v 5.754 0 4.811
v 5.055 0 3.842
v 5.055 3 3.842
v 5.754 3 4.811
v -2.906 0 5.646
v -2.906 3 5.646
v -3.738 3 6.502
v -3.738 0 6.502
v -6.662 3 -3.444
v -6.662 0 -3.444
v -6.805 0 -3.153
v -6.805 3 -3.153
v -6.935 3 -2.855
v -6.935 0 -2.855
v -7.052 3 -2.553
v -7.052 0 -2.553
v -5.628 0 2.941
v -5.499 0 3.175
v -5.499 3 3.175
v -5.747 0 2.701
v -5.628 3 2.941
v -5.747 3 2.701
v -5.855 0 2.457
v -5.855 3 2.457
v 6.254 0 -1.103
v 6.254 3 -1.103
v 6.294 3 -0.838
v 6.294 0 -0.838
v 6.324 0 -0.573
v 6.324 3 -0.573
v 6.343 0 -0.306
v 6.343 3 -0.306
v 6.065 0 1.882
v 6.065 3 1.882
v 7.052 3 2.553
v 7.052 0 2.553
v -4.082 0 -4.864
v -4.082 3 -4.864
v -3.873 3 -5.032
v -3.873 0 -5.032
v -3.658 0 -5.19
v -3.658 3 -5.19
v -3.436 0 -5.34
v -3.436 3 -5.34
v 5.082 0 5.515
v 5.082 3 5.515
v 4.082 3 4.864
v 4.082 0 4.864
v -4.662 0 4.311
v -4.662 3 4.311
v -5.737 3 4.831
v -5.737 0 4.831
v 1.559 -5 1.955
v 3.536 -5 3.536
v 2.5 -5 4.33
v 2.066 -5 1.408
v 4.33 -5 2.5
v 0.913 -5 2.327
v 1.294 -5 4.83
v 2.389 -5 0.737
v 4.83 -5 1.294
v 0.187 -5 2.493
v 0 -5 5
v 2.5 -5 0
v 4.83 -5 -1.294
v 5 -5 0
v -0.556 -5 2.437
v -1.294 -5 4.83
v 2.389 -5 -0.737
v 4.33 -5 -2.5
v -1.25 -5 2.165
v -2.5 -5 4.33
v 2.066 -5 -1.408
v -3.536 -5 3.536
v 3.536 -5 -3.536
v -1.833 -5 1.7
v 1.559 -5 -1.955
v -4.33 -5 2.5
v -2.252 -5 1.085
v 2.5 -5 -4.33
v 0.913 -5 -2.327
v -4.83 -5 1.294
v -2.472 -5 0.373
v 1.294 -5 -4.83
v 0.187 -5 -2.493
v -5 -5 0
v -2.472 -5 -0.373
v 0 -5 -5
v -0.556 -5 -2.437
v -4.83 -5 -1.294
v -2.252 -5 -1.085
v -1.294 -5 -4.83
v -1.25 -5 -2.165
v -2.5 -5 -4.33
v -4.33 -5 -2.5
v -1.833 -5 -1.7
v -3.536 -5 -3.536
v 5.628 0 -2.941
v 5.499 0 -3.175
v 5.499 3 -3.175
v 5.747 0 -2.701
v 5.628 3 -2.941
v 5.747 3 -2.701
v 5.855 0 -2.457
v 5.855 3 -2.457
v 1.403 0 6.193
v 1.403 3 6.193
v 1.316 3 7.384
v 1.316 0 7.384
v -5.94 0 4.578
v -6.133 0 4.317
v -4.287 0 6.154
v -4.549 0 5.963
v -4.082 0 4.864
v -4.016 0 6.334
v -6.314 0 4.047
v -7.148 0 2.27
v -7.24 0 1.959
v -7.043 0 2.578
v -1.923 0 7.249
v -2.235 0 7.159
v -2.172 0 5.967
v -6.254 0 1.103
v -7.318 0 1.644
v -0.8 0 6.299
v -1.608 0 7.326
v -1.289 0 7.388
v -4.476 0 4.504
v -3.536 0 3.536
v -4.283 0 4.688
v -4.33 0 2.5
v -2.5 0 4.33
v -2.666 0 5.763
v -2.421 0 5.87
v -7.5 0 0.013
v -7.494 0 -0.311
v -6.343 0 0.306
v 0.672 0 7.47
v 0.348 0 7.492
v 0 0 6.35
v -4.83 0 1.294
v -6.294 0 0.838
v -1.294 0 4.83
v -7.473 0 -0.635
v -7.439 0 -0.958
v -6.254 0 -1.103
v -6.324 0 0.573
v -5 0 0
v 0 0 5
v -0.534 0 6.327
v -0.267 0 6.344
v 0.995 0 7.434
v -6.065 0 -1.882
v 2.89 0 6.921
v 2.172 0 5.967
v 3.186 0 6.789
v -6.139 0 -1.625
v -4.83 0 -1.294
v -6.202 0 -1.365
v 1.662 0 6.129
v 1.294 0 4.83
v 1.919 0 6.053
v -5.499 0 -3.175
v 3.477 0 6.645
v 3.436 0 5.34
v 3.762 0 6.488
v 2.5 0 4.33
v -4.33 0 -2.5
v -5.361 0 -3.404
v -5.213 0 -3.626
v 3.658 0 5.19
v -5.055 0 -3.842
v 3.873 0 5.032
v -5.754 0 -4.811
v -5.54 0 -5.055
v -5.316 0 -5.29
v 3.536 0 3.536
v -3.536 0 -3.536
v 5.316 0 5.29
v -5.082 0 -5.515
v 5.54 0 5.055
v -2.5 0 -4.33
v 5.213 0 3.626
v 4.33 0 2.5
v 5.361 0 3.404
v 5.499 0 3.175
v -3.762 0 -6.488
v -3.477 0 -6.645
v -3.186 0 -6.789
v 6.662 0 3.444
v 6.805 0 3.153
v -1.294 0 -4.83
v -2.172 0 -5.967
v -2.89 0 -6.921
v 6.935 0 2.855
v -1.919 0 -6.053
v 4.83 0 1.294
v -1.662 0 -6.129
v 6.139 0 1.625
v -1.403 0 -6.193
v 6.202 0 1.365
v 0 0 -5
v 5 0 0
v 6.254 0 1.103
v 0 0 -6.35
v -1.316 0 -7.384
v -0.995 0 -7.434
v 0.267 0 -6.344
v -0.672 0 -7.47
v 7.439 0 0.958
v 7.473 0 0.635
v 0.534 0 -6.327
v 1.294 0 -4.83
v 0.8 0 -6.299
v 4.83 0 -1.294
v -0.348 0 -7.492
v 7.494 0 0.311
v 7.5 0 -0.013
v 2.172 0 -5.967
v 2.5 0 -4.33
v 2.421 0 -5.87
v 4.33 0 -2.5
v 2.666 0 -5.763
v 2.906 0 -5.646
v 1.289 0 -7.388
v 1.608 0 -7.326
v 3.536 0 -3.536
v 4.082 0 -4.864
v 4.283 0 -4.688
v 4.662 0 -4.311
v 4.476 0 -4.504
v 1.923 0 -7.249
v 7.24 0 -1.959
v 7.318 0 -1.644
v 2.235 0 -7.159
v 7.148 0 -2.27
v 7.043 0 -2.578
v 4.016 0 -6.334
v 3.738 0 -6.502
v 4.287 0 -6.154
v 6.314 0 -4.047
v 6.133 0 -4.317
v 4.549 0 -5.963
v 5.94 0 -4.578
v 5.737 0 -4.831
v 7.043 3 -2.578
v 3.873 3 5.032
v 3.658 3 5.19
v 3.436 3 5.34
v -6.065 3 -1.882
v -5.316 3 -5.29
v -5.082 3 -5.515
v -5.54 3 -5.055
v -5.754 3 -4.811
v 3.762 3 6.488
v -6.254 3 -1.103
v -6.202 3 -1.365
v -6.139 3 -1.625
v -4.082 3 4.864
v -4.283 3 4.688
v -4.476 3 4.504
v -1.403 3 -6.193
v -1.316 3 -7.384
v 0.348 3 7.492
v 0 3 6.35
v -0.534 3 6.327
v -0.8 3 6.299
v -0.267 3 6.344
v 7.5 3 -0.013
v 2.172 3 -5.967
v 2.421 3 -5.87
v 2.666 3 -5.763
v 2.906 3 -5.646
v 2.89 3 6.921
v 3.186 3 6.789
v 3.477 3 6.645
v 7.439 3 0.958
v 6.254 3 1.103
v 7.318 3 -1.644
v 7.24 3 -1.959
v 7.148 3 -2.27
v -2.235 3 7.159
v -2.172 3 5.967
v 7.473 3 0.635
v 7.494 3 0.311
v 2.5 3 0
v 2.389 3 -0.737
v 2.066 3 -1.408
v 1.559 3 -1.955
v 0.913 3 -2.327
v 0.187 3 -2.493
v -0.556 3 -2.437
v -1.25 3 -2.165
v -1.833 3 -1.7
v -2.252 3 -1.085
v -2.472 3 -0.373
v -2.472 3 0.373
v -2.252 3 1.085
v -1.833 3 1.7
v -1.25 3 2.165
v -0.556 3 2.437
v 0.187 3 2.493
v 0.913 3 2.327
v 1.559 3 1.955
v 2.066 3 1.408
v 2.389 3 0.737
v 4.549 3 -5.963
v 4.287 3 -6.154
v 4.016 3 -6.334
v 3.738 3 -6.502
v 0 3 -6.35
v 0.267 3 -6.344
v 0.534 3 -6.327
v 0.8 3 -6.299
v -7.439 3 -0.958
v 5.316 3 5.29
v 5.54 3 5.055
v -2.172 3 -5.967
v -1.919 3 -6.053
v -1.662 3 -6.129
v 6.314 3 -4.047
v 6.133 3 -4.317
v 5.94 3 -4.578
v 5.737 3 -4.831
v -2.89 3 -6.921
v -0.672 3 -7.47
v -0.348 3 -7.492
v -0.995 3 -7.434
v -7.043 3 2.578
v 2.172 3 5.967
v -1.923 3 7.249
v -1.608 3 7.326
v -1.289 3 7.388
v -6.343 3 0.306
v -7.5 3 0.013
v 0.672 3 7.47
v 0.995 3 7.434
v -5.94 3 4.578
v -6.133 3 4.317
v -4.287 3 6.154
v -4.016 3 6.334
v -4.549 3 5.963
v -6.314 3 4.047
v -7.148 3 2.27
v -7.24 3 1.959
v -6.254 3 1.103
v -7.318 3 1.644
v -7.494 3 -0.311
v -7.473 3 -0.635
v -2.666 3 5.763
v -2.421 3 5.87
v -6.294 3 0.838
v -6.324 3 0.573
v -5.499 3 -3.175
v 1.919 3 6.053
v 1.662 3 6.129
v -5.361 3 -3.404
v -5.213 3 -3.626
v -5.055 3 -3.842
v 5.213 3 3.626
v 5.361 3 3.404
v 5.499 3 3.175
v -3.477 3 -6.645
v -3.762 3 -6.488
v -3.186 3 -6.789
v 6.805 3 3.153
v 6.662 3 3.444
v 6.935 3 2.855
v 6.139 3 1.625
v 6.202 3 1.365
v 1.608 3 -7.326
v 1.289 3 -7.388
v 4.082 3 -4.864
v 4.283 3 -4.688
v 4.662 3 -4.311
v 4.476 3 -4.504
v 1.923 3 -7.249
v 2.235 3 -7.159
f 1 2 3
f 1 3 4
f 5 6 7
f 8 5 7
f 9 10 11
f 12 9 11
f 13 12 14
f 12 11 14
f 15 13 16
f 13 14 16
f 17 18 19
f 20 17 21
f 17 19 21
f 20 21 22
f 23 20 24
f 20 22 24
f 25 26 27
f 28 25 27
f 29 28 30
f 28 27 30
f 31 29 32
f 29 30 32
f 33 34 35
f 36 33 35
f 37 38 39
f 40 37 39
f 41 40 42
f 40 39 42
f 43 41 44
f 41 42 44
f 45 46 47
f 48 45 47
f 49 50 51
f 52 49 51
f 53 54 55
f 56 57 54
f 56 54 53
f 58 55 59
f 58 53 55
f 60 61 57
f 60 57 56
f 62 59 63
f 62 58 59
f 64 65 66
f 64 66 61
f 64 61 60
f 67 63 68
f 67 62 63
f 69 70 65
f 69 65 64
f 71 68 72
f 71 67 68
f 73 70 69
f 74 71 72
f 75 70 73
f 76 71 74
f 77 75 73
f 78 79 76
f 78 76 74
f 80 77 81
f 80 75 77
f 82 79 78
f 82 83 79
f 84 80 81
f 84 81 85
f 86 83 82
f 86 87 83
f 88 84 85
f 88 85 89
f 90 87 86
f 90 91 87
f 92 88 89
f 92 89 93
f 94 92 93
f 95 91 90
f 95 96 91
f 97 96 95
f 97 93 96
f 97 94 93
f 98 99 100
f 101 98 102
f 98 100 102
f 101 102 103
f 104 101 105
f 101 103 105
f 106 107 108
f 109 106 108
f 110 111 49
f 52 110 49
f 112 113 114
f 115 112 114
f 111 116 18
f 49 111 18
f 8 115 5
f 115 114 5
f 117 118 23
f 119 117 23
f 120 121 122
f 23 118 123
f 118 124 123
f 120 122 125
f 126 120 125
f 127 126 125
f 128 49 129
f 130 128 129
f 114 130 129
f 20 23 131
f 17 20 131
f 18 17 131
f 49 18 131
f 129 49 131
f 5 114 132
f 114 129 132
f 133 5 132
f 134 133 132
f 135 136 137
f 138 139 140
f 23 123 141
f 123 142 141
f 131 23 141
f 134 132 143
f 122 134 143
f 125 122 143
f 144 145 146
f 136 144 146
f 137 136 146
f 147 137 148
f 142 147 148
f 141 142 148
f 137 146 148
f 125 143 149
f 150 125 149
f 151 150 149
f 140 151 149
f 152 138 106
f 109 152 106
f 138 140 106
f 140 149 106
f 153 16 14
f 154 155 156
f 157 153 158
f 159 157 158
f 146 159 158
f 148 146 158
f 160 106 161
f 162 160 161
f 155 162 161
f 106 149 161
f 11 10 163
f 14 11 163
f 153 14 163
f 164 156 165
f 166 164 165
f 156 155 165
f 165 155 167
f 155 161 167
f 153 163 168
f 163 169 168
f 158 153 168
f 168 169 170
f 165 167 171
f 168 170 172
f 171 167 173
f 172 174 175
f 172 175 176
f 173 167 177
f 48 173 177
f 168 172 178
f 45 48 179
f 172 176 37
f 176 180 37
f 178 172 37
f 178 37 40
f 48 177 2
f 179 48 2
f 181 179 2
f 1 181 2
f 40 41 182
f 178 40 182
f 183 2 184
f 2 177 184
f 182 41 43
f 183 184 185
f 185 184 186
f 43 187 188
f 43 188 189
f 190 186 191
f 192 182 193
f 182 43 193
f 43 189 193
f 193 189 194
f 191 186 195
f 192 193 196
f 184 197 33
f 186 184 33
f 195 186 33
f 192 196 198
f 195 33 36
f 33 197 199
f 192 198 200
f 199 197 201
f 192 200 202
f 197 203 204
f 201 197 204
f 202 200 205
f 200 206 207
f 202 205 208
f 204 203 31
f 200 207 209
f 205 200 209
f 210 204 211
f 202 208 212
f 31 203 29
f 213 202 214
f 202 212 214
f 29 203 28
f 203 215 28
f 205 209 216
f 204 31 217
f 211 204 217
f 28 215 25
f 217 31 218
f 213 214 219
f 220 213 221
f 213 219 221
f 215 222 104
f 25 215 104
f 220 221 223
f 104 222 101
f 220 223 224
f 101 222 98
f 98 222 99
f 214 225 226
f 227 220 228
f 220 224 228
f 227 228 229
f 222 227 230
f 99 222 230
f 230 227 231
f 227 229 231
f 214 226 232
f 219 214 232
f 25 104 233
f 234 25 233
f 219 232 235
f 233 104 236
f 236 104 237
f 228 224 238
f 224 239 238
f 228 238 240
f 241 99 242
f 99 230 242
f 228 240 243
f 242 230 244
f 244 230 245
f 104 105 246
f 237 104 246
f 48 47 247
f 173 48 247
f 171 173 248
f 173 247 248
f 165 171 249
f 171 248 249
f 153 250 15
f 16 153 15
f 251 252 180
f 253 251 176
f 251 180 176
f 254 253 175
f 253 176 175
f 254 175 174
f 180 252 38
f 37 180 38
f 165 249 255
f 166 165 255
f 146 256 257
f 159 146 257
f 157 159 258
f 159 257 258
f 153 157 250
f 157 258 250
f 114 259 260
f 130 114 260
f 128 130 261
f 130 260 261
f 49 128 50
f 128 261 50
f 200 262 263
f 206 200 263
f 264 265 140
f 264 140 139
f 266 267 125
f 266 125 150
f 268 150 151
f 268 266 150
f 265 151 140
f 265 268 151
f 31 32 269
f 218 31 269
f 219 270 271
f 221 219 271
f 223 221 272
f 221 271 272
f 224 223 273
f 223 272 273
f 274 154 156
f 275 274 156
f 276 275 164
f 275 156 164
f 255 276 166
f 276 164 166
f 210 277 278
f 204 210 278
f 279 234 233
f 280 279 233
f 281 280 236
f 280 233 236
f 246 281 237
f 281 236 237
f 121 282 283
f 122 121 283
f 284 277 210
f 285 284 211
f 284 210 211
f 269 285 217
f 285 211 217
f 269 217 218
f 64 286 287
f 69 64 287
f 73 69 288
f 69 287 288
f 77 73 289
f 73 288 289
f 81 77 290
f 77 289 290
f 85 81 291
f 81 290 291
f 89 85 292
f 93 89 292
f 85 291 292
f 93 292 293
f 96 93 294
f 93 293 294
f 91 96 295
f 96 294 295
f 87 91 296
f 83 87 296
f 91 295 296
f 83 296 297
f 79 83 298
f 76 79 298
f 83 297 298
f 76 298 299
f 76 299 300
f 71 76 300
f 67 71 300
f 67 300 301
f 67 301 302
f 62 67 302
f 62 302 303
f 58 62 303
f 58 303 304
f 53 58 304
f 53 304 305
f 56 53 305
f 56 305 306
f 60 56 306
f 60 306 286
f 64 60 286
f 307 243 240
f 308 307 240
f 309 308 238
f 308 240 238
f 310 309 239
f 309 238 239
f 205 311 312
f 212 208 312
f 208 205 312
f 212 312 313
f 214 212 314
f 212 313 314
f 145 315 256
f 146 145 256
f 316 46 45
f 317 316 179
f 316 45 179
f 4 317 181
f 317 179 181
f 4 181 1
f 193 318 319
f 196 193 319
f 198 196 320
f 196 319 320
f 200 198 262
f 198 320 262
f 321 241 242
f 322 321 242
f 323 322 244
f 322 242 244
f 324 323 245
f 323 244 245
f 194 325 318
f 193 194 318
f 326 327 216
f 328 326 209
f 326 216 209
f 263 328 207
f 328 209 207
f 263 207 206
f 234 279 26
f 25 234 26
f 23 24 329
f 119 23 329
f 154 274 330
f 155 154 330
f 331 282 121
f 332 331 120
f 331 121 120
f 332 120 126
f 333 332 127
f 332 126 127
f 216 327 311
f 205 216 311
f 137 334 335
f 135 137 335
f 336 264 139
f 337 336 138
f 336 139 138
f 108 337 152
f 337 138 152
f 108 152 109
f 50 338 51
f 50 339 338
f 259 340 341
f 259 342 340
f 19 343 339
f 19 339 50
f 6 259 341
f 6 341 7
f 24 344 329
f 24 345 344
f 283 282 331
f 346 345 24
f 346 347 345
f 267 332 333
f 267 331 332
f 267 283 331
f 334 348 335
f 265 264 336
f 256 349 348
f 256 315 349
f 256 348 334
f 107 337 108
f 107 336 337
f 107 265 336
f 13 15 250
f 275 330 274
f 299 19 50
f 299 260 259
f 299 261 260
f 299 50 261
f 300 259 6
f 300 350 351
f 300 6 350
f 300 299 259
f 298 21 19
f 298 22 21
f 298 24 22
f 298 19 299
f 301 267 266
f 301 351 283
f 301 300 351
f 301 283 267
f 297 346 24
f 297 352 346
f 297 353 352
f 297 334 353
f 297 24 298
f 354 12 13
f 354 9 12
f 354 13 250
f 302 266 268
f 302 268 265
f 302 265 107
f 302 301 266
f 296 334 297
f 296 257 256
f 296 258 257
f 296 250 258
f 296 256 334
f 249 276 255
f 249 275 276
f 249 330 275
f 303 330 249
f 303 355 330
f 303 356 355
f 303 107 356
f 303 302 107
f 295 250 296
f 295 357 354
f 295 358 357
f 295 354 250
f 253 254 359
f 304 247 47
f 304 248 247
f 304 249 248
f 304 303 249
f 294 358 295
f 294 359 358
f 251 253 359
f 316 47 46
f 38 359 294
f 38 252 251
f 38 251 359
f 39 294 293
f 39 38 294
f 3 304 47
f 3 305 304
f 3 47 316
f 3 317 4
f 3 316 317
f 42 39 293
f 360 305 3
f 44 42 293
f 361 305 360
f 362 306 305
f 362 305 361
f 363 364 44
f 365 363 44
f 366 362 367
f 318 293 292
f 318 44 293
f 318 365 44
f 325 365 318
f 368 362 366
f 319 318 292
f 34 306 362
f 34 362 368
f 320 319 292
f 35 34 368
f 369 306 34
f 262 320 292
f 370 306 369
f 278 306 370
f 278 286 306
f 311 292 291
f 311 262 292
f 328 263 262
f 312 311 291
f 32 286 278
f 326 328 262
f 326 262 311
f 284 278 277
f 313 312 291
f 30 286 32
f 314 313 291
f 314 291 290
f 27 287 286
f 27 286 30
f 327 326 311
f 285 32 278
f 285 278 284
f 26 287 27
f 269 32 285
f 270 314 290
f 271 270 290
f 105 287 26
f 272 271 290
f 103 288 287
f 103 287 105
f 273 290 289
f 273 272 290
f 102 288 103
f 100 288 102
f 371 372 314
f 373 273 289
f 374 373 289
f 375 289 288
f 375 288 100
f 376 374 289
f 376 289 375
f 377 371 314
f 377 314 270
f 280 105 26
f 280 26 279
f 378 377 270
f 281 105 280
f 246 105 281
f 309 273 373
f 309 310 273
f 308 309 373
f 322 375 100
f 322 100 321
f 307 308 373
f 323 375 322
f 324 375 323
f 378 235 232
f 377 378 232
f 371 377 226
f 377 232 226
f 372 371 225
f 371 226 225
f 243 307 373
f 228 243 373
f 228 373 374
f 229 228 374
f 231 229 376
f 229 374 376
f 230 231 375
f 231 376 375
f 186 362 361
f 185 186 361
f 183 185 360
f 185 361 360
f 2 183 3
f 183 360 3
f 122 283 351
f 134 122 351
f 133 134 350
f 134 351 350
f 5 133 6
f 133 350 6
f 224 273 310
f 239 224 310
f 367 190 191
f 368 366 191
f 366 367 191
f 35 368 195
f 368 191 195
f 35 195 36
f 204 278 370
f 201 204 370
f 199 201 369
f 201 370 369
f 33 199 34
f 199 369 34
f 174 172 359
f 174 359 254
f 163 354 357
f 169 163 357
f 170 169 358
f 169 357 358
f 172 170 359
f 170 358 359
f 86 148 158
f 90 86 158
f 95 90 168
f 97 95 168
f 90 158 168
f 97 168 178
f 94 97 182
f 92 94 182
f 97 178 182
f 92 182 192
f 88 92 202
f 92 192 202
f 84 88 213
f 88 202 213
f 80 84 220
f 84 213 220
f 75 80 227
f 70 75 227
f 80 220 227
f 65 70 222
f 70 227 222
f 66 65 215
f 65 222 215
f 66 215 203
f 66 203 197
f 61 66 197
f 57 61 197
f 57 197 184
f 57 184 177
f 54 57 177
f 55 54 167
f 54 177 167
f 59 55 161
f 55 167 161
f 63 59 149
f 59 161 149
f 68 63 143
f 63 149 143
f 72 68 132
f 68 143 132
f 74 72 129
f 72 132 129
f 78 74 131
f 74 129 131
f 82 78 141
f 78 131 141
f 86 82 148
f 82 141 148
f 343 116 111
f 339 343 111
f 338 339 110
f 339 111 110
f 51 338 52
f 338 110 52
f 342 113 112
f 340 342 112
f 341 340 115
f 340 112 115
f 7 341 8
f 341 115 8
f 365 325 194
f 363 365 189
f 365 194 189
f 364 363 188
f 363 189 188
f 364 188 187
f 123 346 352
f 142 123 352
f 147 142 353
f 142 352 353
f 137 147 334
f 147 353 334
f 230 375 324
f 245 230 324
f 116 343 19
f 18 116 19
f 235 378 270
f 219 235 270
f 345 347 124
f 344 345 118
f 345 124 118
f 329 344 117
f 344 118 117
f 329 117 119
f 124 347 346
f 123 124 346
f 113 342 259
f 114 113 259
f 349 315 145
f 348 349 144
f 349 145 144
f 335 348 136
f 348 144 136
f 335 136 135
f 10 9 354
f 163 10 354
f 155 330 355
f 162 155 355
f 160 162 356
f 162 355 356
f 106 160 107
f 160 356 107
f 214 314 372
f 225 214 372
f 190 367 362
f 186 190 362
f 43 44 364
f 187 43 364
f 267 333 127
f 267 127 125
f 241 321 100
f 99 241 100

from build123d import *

# Parameters (mm, degrees)
SKETCH1_R           = 7.5
BOSS_EXTRUDE1_DEPTH = 3
SKETCH2_R           = 5
BOSS_EXTRUDE2_DEPTH = 5
CUT_EXTRUDE1_REACH  = 10
SKETCH3_R           = 2.5
CUT_EXTRUDE2_REACH  = 10


with BuildPart() as part:
    # Sketch1 → Boss-Extrude1 (new body)
    with BuildSketch(Plane(origin=(0, 0, 0), x_dir=(1, 0, 0), z_dir=(0, 1, 0))):
        Circle(SKETCH1_R)
    extrude(amount=BOSS_EXTRUDE1_DEPTH)

    # Sketch2 → Boss-Extrude2 (add)
    with BuildSketch(Plane(origin=(0, 0, 0), x_dir=(-1, 0, 0), z_dir=(0, -1, 0))):
        Circle(SKETCH2_R)
    extrude(amount=BOSS_EXTRUDE2_DEPTH)

    # Sketch3 → Cut-Extrude1 (cut, up to next)
    with BuildSketch(Plane(origin=(0, 3, 0), x_dir=(1, 0, 0), z_dir=(0, 1, 0)), mode=Mode.PRIVATE) as cut_extrude1_sk1:
        Circle(SKETCH3_R)
    cut_extrude1_tool1 = extrude(cut_extrude1_sk1.sketch, amount=-CUT_EXTRUDE1_REACH, mode=Mode.PRIVATE) & part.part
    add(cut_extrude1_tool1.solids().sort_by_distance((0, 3, 0))[0], mode=Mode.SUBTRACT)

    # Sketch4 → Cut-Extrude2 (cut, up to next)
    with BuildSketch(Plane(origin=(0, 3, 0), x_dir=(1, 0, 0), z_dir=(0, 1, 0)), mode=Mode.PRIVATE) as cut_extrude2_sk1:
        with BuildLine():
            Line((-1.289148398, -7.388375762), (-0.799951005, -6.299410956))
            ThreePointArc((-0.799951005, -6.299410956), (-0.400774519, -6.337340119), (0, -6.35))
            Line((0, -6.35), (0.348116052, -7.491916658))
            ThreePointArc((0.348116052, -7.491916658), (-0.473355731, -7.485047385), (-1.289148398, -7.388375762))
        make_face()
    cut_extrude2_tool1 = extrude(cut_extrude2_sk1.sketch, amount=-CUT_EXTRUDE2_REACH, mode=Mode.PRIVATE) & part.part
    add(cut_extrude2_tool1.solids().sort_by_distance((-0.440605, 3, 6.967167))[0], mode=Mode.SUBTRACT)
    # Sketch4 → Cut-Extrude2 (cut, up to next)
    with BuildSketch(Plane(origin=(0, 3, 0), x_dir=(1, 0, 0), z_dir=(0, 1, 0)), mode=Mode.PRIVATE) as cut_extrude2_sk2:
        with BuildLine():
            Line((-2.235264324, -7.159161501), (-2.17182791, -5.967048142))
            ThreePointArc((-2.17182791, -5.967048142), (-2.544102834, -5.818078787), (-2.906233494, -5.645910633))
            Line((-2.906233494, -5.645910633), (-3.738376574, -6.501887464))
            ThreePointArc((-3.738376574, -6.501887464), (-3.004845867, -6.871746599), (-2.235264324, -7.159161501))
        make_face()
    cut_extrude2_tool2 = extrude(cut_extrude2_sk2.sketch, amount=-CUT_EXTRUDE2_REACH, mode=Mode.PRIVATE) & part.part
    add(cut_extrude2_tool2.solids().sort_by_distance((-2.796945, 3, 6.3963))[0], mode=Mode.SUBTRACT)
    # Sketch4 → Cut-Extrude2 (cut, up to next)
    with BuildSketch(Plane(origin=(0, 3, 0), x_dir=(1, 0, 0), z_dir=(0, 1, 0)), mode=Mode.PRIVATE) as cut_extrude2_sk3:
        with BuildLine():
            Line((-4.549038834, -5.962905809), (-4.081701322, -4.864382214))
            ThreePointArc((-4.081701322, -4.864382214), (-4.3805748, -4.597071287), (-4.661981333, -4.311430164))
            Line((-4.661981333, -4.311430164), (-5.736701363, -4.831175579))
            ThreePointArc((-5.736701363, -4.831175579), (-5.173907244, -5.429611756), (-4.549038834, -5.962905809))
        make_face()
    cut_extrude2_tool3 = extrude(cut_extrude2_sk3.sketch, amount=-CUT_EXTRUDE2_REACH, mode=Mode.PRIVATE) & part.part
    add(cut_extrude2_tool3.solids().sort_by_distance((-4.815932, 3, 5.053944))[0], mode=Mode.SUBTRACT)
    # Sketch4 → Cut-Extrude2 (cut, up to next)
    with BuildSketch(Plane(origin=(0, 3, 0), x_dir=(1, 0, 0), z_dir=(0, 1, 0)), mode=Mode.PRIVATE) as cut_extrude2_sk4:
        with BuildLine():
            Line((-6.314132123, -4.047435674), (-5.499261314, -3.175))
            ThreePointArc((-5.499261314, -3.175), (-5.688684795, -2.821589145), (-5.855425419, -2.456927586))
            Line((-5.855425419, -2.456927586), (-7.043095302, -2.577752619))
            ThreePointArc((-7.043095302, -2.577752619), (-6.718919049, -3.332585604), (-6.314132123, -4.047435674))
        make_face()
    cut_extrude2_tool4 = extrude(cut_extrude2_sk4.sketch, amount=-CUT_EXTRUDE2_REACH, mode=Mode.PRIVATE) & part.part
    add(cut_extrude2_tool4.solids().sort_by_distance((-6.254046, 3, 3.102009))[0], mode=Mode.SUBTRACT)
    # Sketch4 → Cut-Extrude2 (cut, up to next)
    with BuildSketch(Plane(origin=(0, 3, 0), x_dir=(1, 0, 0), z_dir=(0, 1, 0)), mode=Mode.PRIVATE) as cut_extrude2_sk5:
        with BuildLine():
            Line((-7.317647892, -1.643785062), (-6.253529232, -1.102665928))
            ThreePointArc((-6.253529232, -1.102665928), (-6.310655448, -0.705781709), (-6.342618783, -0.306083282))
            Line((-6.342618783, -0.306083282), (-7.499988003, -0.01341465))
            ThreePointArc((-7.499988003, -0.01341465), (-7.453530056, -0.833600444), (-7.317647892, -1.643785062))
        make_face()
    cut_extrude2_tool5 = extrude(cut_extrude2_sk5.sketch, amount=-CUT_EXTRUDE2_REACH, mode=Mode.PRIVATE) & part.part
    add(cut_extrude2_tool5.solids().sort_by_distance((-6.93783, 3, 0.775925))[0], mode=Mode.SUBTRACT)
    # Sketch4 → Cut-Extrude2 (cut, up to next)
    with BuildSketch(Plane(origin=(0, 3, 0), x_dir=(1, 0, 0), z_dir=(0, 1, 0)), mode=Mode.PRIVATE) as cut_extrude2_sk6:
        with BuildLine():
            Line((-7.438547328, 0.958130288), (-6.253529232, 1.102665928))
            ThreePointArc((-6.253529232, 1.102665928), (-6.171467918, 1.495153417), (-6.064798715, 1.881679184))
            Line((-6.064798715, 1.881679184), (-7.052271463, 2.552541324))
            ThreePointArc((-7.052271463, 2.552541324), (-7.289135336, 1.765929232), (-7.438547328, 0.958130288))
        make_face()
    cut_extrude2_tool6 = extrude(cut_extrude2_sk6.sketch, amount=-CUT_EXTRUDE2_REACH, mode=Mode.PRIVATE) & part.part
    add(cut_extrude2_tool6.solids().sort_by_distance((-6.78481, 3, -1.643747))[0], mode=Mode.SUBTRACT)
    # Sketch4 → Cut-Extrude2 (cut, up to next)
    with BuildSketch(Plane(origin=(0, 3, 0), x_dir=(1, 0, 0), z_dir=(0, 1, 0)), mode=Mode.PRIVATE) as cut_extrude2_sk7:
        with BuildLine():
            Line((-6.662248175, 3.444480985), (-5.499261314, 3.175))
            ThreePointArc((-5.499261314, 3.175), (-5.287910276, 3.515750974), (-5.055474414, 3.84248337))
            Line((-5.055474414, 3.84248337), (-5.753946904, 4.810623143))
            ThreePointArc((-5.753946904, 4.810623143), (-6.245563318, 4.152461781), (-6.662248175, 3.444480985))
        make_face()
    cut_extrude2_tool7 = extrude(cut_extrude2_sk7.sketch, amount=-CUT_EXTRUDE2_REACH, mode=Mode.PRIVATE) & part.part
    add(cut_extrude2_tool7.solids().sort_by_distance((-5.813441, 3, -3.865159))[0], mode=Mode.SUBTRACT)
    # Sketch4 → Cut-Extrude2 (cut, up to next)
    with BuildSketch(Plane(origin=(0, 3, 0), x_dir=(1, 0, 0), z_dir=(0, 1, 0)), mode=Mode.PRIVATE) as cut_extrude2_sk8:
        with BuildLine():
            Line((-5.082383568, 5.51537644), (-4.081701322, 4.864382214))
            ThreePointArc((-4.081701322, 4.864382214), (-3.766552614, 5.112297078), (-3.436385289, 5.339827352))
            Line((-3.436385289, 5.339827352), (-3.761611429, 6.488472814))
            ThreePointArc((-3.761611429, 6.488472814), (-4.448684189, 6.038146155), (-5.082383568, 5.51537644))
        make_face()
    cut_extrude2_tool8 = extrude(cut_extrude2_sk8.sketch, amount=-CUT_EXTRUDE2_REACH, mode=Mode.PRIVATE) & part.part
    add(cut_extrude2_tool8.solids().sort_by_distance((-4.140886, 3, -5.620375))[0], mode=Mode.SUBTRACT)
    # Sketch4 → Cut-Extrude2 (cut, up to next)
    with BuildSketch(Plane(origin=(0, 3, 0), x_dir=(1, 0, 0), z_dir=(0, 1, 0)), mode=Mode.PRIVATE) as cut_extrude2_sk9:
        with BuildLine():
            Line((-2.889508494, 6.921036097), (-2.17182791, 5.967048142))
            ThreePointArc((-2.17182791, 5.967048142), (-1.790893118, 6.092224704), (-1.402817382, 6.193109348))
            Line((-1.402817382, 6.193109348), (-1.3155701, 7.383716903))
            ThreePointArc((-1.3155701, 7.383716903), (-2.115228092, 7.195540989), (-2.889508494, 6.921036097))
        make_face()
    cut_extrude2_tool9 = extrude(cut_extrude2_sk9.sketch, amount=-CUT_EXTRUDE2_REACH, mode=Mode.PRIVATE) & part.part
    add(cut_extrude2_tool9.solids().sort_by_distance((-1.968878, 3, -6.697691))[0], mode=Mode.SUBTRACT)
    # Sketch4 → Cut-Extrude2 (cut, up to next)
    with BuildSketch(Plane(origin=(0, 3, 0), x_dir=(1, 0, 0), z_dir=(0, 1, 0)), mode=Mode.PRIVATE) as cut_extrude2_sk10:
        with BuildLine():
            Line((-0.348116052, 7.491916658), (0, 6.35))
            ThreePointArc((0, 6.35), (0.400774519, 6.337340119), (0.799951005, 6.299410956))
            Line((0.799951005, 6.299410956), (1.289148398, 7.388375762))
            ThreePointArc((1.289148398, 7.388375762), (0.473355731, 7.485047385), (-0.348116052, 7.491916658))
        make_face()
    cut_extrude2_tool10 = extrude(cut_extrude2_sk10.sketch, amount=-CUT_EXTRUDE2_REACH, mode=Mode.PRIVATE) & part.part
    add(cut_extrude2_tool10.solids().sort_by_distance((0.440605, 3, -6.967167))[0], mode=Mode.SUBTRACT)
    # Sketch4 → Cut-Extrude2 (cut, up to next)
    with BuildSketch(Plane(origin=(0, 3, 0), x_dir=(1, 0, 0), z_dir=(0, 1, 0)), mode=Mode.PRIVATE) as cut_extrude2_sk11:
        with BuildLine():
            Line((2.235264324, 7.159161501), (2.17182791, 5.967048142))
            ThreePointArc((2.17182791, 5.967048142), (2.544102834, 5.818078787), (2.906233494, 5.645910633))
            Line((2.906233494, 5.645910633), (3.738376574, 6.501887464))
            ThreePointArc((3.738376574, 6.501887464), (3.004845867, 6.871746599), (2.235264324, 7.159161501))
        make_face()
    cut_extrude2_tool11 = extrude(cut_extrude2_sk11.sketch, amount=-CUT_EXTRUDE2_REACH, mode=Mode.PRIVATE) & part.part
    add(cut_extrude2_tool11.solids().sort_by_distance((2.796945, 3, -6.3963))[0], mode=Mode.SUBTRACT)
    # Sketch4 → Cut-Extrude2 (cut, up to next)
    with BuildSketch(Plane(origin=(0, 3, 0), x_dir=(1, 0, 0), z_dir=(0, 1, 0)), mode=Mode.PRIVATE) as cut_extrude2_sk12:
        with BuildLine():
            Line((4.549038834, 5.962905809), (4.081701322, 4.864382214))
            ThreePointArc((4.081701322, 4.864382214), (4.3805748, 4.597071287), (4.661981333, 4.311430164))
            Line((4.661981333, 4.311430164), (5.736701363, 4.831175579))
            ThreePointArc((5.736701363, 4.831175579), (5.173907244, 5.429611756), (4.549038834, 5.962905809))
        make_face()
    cut_extrude2_tool12 = extrude(cut_extrude2_sk12.sketch, amount=-CUT_EXTRUDE2_REACH, mode=Mode.PRIVATE) & part.part
    add(cut_extrude2_tool12.solids().sort_by_distance((4.815932, 3, -5.053944))[0], mode=Mode.SUBTRACT)
    # Sketch4 → Cut-Extrude2 (cut, up to next)
    with BuildSketch(Plane(origin=(0, 3, 0), x_dir=(1, 0, 0), z_dir=(0, 1, 0)), mode=Mode.PRIVATE) as cut_extrude2_sk13:
        with BuildLine():
            Line((6.314132123, 4.047435674), (5.499261314, 3.175))
            ThreePointArc((5.499261314, 3.175), (5.688684795, 2.821589145), (5.855425419, 2.456927586))
            Line((5.855425419, 2.456927586), (7.043095302, 2.577752619))
            ThreePointArc((7.043095302, 2.577752619), (6.718919049, 3.332585604), (6.314132123, 4.047435674))
        make_face()
    cut_extrude2_tool13 = extrude(cut_extrude2_sk13.sketch, amount=-CUT_EXTRUDE2_REACH, mode=Mode.PRIVATE) & part.part
    add(cut_extrude2_tool13.solids().sort_by_distance((6.254046, 3, -3.102009))[0], mode=Mode.SUBTRACT)
    # Sketch4 → Cut-Extrude2 (cut, up to next)
    with BuildSketch(Plane(origin=(0, 3, 0), x_dir=(1, 0, 0), z_dir=(0, 1, 0)), mode=Mode.PRIVATE) as cut_extrude2_sk14:
        with BuildLine():
            Line((7.317647892, 1.643785062), (6.253529232, 1.102665928))
            ThreePointArc((6.253529232, 1.102665928), (6.310655448, 0.705781709), (6.342618783, 0.306083282))
            Line((6.342618783, 0.306083282), (7.499988003, 0.01341465))
            ThreePointArc((7.499988003, 0.01341465), (7.453530056, 0.833600444), (7.317647892, 1.643785062))
        make_face()
    cut_extrude2_tool14 = extrude(cut_extrude2_sk14.sketch, amount=-CUT_EXTRUDE2_REACH, mode=Mode.PRIVATE) & part.part
    add(cut_extrude2_tool14.solids().sort_by_distance((6.93783, 3, -0.775925))[0], mode=Mode.SUBTRACT)
    # Sketch4 → Cut-Extrude2 (cut, up to next)
    with BuildSketch(Plane(origin=(0, 3, 0), x_dir=(1, 0, 0), z_dir=(0, 1, 0)), mode=Mode.PRIVATE) as cut_extrude2_sk15:
        with BuildLine():
            Line((7.438547328, -0.958130288), (6.253529232, -1.102665928))
            ThreePointArc((6.253529232, -1.102665928), (6.171467918, -1.495153417), (6.064798715, -1.881679184))
            Line((6.064798715, -1.881679184), (7.052271463, -2.552541324))
            ThreePointArc((7.052271463, -2.552541324), (7.289135336, -1.765929232), (7.438547328, -0.958130288))
        make_face()
    cut_extrude2_tool15 = extrude(cut_extrude2_sk15.sketch, amount=-CUT_EXTRUDE2_REACH, mode=Mode.PRIVATE) & part.part
    add(cut_extrude2_tool15.solids().sort_by_distance((6.78481, 3, 1.643747))[0], mode=Mode.SUBTRACT)
    # Sketch4 → Cut-Extrude2 (cut, up to next)
    with BuildSketch(Plane(origin=(0, 3, 0), x_dir=(1, 0, 0), z_dir=(0, 1, 0)), mode=Mode.PRIVATE) as cut_extrude2_sk16:
        with BuildLine():
            Line((6.662248175, -3.444480985), (5.499261314, -3.175))
            ThreePointArc((5.499261314, -3.175), (5.287910276, -3.515750974), (5.055474414, -3.84248337))
            Line((5.055474414, -3.84248337), (5.753946904, -4.810623143))
            ThreePointArc((5.753946904, -4.810623143), (6.245563318, -4.152461781), (6.662248175, -3.444480985))
        make_face()
    cut_extrude2_tool16 = extrude(cut_extrude2_sk16.sketch, amount=-CUT_EXTRUDE2_REACH, mode=Mode.PRIVATE) & part.part
    add(cut_extrude2_tool16.solids().sort_by_distance((5.813441, 3, 3.865159))[0], mode=Mode.SUBTRACT)
    # Sketch4 → Cut-Extrude2 (cut, up to next)
    with BuildSketch(Plane(origin=(0, 3, 0), x_dir=(1, 0, 0), z_dir=(0, 1, 0)), mode=Mode.PRIVATE) as cut_extrude2_sk17:
        with BuildLine():
            Line((5.082383568, -5.51537644), (4.081701322, -4.864382214))
            ThreePointArc((4.081701322, -4.864382214), (3.766552614, -5.112297078), (3.436385289, -5.339827352))
            Line((3.436385289, -5.339827352), (3.761611429, -6.488472814))
            ThreePointArc((3.761611429, -6.488472814), (4.448684189, -6.038146155), (5.082383568, -5.51537644))
        make_face()
    cut_extrude2_tool17 = extrude(cut_extrude2_sk17.sketch, amount=-CUT_EXTRUDE2_REACH, mode=Mode.PRIVATE) & part.part
    add(cut_extrude2_tool17.solids().sort_by_distance((4.140886, 3, 5.620375))[0], mode=Mode.SUBTRACT)
    # Sketch4 → Cut-Extrude2 (cut, up to next)
    with BuildSketch(Plane(origin=(0, 3, 0), x_dir=(1, 0, 0), z_dir=(0, 1, 0)), mode=Mode.PRIVATE) as cut_extrude2_sk18:
        with BuildLine():
            Line((2.889508494, -6.921036097), (2.17182791, -5.967048142))
            ThreePointArc((2.17182791, -5.967048142), (1.790893118, -6.092224704), (1.402817382, -6.193109348))
            Line((1.402817382, -6.193109348), (1.3155701, -7.383716903))
            ThreePointArc((1.3155701, -7.383716903), (2.115228092, -7.195540989), (2.889508494, -6.921036097))
        make_face()
    cut_extrude2_tool18 = extrude(cut_extrude2_sk18.sketch, amount=-CUT_EXTRUDE2_REACH, mode=Mode.PRIVATE) & part.part
    add(cut_extrude2_tool18.solids().sort_by_distance((1.968878, 3, 6.697691))[0], mode=Mode.SUBTRACT)


solid = part.part
